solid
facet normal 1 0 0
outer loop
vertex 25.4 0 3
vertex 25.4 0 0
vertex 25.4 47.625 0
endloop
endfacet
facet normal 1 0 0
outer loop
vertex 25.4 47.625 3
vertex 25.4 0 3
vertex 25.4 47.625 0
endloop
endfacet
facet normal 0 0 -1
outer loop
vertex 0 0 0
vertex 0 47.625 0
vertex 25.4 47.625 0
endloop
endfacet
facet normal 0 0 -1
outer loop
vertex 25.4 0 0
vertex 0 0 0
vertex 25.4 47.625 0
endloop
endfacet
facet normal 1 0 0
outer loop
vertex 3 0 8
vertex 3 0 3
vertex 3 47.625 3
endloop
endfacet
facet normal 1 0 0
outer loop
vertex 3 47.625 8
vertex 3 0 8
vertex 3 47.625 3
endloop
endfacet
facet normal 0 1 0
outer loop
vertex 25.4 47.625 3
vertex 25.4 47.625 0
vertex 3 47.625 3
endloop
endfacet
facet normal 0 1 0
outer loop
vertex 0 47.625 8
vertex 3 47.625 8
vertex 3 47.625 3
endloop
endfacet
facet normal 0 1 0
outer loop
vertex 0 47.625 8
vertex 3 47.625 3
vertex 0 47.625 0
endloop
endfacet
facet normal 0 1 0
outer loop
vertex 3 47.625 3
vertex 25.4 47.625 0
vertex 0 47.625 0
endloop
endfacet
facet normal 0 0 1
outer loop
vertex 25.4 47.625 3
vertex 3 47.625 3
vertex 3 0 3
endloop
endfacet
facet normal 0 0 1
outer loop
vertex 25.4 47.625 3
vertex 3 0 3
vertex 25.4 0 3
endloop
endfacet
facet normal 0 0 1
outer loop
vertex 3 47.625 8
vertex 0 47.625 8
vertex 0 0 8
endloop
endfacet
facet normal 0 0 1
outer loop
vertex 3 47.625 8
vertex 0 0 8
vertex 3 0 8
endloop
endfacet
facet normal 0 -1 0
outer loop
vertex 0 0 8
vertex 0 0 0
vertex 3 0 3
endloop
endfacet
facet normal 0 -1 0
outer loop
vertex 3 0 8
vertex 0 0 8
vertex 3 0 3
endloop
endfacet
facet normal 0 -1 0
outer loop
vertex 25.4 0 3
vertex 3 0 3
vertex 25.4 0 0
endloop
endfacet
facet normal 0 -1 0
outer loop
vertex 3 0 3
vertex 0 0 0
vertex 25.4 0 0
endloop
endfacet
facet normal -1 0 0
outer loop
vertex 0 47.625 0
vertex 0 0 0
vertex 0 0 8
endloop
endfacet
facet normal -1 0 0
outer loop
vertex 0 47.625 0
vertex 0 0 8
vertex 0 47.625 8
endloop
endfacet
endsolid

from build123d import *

# Parameters (mm, degrees)
F0_W     = 3
F0_H     = 47.625
F0_W_2   = 22.4
F1_DEPTH = 3
F2_DEPTH = 8


with BuildPart() as f1:
    # F0 (on Top) → F1 (new body)
    with BuildSketch(Plane.XY):
        with Locations((1.5, 23.8125)):
            Rectangle(F0_W, F0_H)
        with Locations((14.2, 23.8125)):
            Rectangle(F0_W_2, F0_H)
    extrude(amount=F1_DEPTH)

    # F0 (on Top) → F2 (join)
    with BuildSketch(Plane.XY):
        with Locations((1.5, 23.8125)):
            Rectangle(F0_W, F0_H)
    extrude(amount=F2_DEPTH)


solid = f1.part
